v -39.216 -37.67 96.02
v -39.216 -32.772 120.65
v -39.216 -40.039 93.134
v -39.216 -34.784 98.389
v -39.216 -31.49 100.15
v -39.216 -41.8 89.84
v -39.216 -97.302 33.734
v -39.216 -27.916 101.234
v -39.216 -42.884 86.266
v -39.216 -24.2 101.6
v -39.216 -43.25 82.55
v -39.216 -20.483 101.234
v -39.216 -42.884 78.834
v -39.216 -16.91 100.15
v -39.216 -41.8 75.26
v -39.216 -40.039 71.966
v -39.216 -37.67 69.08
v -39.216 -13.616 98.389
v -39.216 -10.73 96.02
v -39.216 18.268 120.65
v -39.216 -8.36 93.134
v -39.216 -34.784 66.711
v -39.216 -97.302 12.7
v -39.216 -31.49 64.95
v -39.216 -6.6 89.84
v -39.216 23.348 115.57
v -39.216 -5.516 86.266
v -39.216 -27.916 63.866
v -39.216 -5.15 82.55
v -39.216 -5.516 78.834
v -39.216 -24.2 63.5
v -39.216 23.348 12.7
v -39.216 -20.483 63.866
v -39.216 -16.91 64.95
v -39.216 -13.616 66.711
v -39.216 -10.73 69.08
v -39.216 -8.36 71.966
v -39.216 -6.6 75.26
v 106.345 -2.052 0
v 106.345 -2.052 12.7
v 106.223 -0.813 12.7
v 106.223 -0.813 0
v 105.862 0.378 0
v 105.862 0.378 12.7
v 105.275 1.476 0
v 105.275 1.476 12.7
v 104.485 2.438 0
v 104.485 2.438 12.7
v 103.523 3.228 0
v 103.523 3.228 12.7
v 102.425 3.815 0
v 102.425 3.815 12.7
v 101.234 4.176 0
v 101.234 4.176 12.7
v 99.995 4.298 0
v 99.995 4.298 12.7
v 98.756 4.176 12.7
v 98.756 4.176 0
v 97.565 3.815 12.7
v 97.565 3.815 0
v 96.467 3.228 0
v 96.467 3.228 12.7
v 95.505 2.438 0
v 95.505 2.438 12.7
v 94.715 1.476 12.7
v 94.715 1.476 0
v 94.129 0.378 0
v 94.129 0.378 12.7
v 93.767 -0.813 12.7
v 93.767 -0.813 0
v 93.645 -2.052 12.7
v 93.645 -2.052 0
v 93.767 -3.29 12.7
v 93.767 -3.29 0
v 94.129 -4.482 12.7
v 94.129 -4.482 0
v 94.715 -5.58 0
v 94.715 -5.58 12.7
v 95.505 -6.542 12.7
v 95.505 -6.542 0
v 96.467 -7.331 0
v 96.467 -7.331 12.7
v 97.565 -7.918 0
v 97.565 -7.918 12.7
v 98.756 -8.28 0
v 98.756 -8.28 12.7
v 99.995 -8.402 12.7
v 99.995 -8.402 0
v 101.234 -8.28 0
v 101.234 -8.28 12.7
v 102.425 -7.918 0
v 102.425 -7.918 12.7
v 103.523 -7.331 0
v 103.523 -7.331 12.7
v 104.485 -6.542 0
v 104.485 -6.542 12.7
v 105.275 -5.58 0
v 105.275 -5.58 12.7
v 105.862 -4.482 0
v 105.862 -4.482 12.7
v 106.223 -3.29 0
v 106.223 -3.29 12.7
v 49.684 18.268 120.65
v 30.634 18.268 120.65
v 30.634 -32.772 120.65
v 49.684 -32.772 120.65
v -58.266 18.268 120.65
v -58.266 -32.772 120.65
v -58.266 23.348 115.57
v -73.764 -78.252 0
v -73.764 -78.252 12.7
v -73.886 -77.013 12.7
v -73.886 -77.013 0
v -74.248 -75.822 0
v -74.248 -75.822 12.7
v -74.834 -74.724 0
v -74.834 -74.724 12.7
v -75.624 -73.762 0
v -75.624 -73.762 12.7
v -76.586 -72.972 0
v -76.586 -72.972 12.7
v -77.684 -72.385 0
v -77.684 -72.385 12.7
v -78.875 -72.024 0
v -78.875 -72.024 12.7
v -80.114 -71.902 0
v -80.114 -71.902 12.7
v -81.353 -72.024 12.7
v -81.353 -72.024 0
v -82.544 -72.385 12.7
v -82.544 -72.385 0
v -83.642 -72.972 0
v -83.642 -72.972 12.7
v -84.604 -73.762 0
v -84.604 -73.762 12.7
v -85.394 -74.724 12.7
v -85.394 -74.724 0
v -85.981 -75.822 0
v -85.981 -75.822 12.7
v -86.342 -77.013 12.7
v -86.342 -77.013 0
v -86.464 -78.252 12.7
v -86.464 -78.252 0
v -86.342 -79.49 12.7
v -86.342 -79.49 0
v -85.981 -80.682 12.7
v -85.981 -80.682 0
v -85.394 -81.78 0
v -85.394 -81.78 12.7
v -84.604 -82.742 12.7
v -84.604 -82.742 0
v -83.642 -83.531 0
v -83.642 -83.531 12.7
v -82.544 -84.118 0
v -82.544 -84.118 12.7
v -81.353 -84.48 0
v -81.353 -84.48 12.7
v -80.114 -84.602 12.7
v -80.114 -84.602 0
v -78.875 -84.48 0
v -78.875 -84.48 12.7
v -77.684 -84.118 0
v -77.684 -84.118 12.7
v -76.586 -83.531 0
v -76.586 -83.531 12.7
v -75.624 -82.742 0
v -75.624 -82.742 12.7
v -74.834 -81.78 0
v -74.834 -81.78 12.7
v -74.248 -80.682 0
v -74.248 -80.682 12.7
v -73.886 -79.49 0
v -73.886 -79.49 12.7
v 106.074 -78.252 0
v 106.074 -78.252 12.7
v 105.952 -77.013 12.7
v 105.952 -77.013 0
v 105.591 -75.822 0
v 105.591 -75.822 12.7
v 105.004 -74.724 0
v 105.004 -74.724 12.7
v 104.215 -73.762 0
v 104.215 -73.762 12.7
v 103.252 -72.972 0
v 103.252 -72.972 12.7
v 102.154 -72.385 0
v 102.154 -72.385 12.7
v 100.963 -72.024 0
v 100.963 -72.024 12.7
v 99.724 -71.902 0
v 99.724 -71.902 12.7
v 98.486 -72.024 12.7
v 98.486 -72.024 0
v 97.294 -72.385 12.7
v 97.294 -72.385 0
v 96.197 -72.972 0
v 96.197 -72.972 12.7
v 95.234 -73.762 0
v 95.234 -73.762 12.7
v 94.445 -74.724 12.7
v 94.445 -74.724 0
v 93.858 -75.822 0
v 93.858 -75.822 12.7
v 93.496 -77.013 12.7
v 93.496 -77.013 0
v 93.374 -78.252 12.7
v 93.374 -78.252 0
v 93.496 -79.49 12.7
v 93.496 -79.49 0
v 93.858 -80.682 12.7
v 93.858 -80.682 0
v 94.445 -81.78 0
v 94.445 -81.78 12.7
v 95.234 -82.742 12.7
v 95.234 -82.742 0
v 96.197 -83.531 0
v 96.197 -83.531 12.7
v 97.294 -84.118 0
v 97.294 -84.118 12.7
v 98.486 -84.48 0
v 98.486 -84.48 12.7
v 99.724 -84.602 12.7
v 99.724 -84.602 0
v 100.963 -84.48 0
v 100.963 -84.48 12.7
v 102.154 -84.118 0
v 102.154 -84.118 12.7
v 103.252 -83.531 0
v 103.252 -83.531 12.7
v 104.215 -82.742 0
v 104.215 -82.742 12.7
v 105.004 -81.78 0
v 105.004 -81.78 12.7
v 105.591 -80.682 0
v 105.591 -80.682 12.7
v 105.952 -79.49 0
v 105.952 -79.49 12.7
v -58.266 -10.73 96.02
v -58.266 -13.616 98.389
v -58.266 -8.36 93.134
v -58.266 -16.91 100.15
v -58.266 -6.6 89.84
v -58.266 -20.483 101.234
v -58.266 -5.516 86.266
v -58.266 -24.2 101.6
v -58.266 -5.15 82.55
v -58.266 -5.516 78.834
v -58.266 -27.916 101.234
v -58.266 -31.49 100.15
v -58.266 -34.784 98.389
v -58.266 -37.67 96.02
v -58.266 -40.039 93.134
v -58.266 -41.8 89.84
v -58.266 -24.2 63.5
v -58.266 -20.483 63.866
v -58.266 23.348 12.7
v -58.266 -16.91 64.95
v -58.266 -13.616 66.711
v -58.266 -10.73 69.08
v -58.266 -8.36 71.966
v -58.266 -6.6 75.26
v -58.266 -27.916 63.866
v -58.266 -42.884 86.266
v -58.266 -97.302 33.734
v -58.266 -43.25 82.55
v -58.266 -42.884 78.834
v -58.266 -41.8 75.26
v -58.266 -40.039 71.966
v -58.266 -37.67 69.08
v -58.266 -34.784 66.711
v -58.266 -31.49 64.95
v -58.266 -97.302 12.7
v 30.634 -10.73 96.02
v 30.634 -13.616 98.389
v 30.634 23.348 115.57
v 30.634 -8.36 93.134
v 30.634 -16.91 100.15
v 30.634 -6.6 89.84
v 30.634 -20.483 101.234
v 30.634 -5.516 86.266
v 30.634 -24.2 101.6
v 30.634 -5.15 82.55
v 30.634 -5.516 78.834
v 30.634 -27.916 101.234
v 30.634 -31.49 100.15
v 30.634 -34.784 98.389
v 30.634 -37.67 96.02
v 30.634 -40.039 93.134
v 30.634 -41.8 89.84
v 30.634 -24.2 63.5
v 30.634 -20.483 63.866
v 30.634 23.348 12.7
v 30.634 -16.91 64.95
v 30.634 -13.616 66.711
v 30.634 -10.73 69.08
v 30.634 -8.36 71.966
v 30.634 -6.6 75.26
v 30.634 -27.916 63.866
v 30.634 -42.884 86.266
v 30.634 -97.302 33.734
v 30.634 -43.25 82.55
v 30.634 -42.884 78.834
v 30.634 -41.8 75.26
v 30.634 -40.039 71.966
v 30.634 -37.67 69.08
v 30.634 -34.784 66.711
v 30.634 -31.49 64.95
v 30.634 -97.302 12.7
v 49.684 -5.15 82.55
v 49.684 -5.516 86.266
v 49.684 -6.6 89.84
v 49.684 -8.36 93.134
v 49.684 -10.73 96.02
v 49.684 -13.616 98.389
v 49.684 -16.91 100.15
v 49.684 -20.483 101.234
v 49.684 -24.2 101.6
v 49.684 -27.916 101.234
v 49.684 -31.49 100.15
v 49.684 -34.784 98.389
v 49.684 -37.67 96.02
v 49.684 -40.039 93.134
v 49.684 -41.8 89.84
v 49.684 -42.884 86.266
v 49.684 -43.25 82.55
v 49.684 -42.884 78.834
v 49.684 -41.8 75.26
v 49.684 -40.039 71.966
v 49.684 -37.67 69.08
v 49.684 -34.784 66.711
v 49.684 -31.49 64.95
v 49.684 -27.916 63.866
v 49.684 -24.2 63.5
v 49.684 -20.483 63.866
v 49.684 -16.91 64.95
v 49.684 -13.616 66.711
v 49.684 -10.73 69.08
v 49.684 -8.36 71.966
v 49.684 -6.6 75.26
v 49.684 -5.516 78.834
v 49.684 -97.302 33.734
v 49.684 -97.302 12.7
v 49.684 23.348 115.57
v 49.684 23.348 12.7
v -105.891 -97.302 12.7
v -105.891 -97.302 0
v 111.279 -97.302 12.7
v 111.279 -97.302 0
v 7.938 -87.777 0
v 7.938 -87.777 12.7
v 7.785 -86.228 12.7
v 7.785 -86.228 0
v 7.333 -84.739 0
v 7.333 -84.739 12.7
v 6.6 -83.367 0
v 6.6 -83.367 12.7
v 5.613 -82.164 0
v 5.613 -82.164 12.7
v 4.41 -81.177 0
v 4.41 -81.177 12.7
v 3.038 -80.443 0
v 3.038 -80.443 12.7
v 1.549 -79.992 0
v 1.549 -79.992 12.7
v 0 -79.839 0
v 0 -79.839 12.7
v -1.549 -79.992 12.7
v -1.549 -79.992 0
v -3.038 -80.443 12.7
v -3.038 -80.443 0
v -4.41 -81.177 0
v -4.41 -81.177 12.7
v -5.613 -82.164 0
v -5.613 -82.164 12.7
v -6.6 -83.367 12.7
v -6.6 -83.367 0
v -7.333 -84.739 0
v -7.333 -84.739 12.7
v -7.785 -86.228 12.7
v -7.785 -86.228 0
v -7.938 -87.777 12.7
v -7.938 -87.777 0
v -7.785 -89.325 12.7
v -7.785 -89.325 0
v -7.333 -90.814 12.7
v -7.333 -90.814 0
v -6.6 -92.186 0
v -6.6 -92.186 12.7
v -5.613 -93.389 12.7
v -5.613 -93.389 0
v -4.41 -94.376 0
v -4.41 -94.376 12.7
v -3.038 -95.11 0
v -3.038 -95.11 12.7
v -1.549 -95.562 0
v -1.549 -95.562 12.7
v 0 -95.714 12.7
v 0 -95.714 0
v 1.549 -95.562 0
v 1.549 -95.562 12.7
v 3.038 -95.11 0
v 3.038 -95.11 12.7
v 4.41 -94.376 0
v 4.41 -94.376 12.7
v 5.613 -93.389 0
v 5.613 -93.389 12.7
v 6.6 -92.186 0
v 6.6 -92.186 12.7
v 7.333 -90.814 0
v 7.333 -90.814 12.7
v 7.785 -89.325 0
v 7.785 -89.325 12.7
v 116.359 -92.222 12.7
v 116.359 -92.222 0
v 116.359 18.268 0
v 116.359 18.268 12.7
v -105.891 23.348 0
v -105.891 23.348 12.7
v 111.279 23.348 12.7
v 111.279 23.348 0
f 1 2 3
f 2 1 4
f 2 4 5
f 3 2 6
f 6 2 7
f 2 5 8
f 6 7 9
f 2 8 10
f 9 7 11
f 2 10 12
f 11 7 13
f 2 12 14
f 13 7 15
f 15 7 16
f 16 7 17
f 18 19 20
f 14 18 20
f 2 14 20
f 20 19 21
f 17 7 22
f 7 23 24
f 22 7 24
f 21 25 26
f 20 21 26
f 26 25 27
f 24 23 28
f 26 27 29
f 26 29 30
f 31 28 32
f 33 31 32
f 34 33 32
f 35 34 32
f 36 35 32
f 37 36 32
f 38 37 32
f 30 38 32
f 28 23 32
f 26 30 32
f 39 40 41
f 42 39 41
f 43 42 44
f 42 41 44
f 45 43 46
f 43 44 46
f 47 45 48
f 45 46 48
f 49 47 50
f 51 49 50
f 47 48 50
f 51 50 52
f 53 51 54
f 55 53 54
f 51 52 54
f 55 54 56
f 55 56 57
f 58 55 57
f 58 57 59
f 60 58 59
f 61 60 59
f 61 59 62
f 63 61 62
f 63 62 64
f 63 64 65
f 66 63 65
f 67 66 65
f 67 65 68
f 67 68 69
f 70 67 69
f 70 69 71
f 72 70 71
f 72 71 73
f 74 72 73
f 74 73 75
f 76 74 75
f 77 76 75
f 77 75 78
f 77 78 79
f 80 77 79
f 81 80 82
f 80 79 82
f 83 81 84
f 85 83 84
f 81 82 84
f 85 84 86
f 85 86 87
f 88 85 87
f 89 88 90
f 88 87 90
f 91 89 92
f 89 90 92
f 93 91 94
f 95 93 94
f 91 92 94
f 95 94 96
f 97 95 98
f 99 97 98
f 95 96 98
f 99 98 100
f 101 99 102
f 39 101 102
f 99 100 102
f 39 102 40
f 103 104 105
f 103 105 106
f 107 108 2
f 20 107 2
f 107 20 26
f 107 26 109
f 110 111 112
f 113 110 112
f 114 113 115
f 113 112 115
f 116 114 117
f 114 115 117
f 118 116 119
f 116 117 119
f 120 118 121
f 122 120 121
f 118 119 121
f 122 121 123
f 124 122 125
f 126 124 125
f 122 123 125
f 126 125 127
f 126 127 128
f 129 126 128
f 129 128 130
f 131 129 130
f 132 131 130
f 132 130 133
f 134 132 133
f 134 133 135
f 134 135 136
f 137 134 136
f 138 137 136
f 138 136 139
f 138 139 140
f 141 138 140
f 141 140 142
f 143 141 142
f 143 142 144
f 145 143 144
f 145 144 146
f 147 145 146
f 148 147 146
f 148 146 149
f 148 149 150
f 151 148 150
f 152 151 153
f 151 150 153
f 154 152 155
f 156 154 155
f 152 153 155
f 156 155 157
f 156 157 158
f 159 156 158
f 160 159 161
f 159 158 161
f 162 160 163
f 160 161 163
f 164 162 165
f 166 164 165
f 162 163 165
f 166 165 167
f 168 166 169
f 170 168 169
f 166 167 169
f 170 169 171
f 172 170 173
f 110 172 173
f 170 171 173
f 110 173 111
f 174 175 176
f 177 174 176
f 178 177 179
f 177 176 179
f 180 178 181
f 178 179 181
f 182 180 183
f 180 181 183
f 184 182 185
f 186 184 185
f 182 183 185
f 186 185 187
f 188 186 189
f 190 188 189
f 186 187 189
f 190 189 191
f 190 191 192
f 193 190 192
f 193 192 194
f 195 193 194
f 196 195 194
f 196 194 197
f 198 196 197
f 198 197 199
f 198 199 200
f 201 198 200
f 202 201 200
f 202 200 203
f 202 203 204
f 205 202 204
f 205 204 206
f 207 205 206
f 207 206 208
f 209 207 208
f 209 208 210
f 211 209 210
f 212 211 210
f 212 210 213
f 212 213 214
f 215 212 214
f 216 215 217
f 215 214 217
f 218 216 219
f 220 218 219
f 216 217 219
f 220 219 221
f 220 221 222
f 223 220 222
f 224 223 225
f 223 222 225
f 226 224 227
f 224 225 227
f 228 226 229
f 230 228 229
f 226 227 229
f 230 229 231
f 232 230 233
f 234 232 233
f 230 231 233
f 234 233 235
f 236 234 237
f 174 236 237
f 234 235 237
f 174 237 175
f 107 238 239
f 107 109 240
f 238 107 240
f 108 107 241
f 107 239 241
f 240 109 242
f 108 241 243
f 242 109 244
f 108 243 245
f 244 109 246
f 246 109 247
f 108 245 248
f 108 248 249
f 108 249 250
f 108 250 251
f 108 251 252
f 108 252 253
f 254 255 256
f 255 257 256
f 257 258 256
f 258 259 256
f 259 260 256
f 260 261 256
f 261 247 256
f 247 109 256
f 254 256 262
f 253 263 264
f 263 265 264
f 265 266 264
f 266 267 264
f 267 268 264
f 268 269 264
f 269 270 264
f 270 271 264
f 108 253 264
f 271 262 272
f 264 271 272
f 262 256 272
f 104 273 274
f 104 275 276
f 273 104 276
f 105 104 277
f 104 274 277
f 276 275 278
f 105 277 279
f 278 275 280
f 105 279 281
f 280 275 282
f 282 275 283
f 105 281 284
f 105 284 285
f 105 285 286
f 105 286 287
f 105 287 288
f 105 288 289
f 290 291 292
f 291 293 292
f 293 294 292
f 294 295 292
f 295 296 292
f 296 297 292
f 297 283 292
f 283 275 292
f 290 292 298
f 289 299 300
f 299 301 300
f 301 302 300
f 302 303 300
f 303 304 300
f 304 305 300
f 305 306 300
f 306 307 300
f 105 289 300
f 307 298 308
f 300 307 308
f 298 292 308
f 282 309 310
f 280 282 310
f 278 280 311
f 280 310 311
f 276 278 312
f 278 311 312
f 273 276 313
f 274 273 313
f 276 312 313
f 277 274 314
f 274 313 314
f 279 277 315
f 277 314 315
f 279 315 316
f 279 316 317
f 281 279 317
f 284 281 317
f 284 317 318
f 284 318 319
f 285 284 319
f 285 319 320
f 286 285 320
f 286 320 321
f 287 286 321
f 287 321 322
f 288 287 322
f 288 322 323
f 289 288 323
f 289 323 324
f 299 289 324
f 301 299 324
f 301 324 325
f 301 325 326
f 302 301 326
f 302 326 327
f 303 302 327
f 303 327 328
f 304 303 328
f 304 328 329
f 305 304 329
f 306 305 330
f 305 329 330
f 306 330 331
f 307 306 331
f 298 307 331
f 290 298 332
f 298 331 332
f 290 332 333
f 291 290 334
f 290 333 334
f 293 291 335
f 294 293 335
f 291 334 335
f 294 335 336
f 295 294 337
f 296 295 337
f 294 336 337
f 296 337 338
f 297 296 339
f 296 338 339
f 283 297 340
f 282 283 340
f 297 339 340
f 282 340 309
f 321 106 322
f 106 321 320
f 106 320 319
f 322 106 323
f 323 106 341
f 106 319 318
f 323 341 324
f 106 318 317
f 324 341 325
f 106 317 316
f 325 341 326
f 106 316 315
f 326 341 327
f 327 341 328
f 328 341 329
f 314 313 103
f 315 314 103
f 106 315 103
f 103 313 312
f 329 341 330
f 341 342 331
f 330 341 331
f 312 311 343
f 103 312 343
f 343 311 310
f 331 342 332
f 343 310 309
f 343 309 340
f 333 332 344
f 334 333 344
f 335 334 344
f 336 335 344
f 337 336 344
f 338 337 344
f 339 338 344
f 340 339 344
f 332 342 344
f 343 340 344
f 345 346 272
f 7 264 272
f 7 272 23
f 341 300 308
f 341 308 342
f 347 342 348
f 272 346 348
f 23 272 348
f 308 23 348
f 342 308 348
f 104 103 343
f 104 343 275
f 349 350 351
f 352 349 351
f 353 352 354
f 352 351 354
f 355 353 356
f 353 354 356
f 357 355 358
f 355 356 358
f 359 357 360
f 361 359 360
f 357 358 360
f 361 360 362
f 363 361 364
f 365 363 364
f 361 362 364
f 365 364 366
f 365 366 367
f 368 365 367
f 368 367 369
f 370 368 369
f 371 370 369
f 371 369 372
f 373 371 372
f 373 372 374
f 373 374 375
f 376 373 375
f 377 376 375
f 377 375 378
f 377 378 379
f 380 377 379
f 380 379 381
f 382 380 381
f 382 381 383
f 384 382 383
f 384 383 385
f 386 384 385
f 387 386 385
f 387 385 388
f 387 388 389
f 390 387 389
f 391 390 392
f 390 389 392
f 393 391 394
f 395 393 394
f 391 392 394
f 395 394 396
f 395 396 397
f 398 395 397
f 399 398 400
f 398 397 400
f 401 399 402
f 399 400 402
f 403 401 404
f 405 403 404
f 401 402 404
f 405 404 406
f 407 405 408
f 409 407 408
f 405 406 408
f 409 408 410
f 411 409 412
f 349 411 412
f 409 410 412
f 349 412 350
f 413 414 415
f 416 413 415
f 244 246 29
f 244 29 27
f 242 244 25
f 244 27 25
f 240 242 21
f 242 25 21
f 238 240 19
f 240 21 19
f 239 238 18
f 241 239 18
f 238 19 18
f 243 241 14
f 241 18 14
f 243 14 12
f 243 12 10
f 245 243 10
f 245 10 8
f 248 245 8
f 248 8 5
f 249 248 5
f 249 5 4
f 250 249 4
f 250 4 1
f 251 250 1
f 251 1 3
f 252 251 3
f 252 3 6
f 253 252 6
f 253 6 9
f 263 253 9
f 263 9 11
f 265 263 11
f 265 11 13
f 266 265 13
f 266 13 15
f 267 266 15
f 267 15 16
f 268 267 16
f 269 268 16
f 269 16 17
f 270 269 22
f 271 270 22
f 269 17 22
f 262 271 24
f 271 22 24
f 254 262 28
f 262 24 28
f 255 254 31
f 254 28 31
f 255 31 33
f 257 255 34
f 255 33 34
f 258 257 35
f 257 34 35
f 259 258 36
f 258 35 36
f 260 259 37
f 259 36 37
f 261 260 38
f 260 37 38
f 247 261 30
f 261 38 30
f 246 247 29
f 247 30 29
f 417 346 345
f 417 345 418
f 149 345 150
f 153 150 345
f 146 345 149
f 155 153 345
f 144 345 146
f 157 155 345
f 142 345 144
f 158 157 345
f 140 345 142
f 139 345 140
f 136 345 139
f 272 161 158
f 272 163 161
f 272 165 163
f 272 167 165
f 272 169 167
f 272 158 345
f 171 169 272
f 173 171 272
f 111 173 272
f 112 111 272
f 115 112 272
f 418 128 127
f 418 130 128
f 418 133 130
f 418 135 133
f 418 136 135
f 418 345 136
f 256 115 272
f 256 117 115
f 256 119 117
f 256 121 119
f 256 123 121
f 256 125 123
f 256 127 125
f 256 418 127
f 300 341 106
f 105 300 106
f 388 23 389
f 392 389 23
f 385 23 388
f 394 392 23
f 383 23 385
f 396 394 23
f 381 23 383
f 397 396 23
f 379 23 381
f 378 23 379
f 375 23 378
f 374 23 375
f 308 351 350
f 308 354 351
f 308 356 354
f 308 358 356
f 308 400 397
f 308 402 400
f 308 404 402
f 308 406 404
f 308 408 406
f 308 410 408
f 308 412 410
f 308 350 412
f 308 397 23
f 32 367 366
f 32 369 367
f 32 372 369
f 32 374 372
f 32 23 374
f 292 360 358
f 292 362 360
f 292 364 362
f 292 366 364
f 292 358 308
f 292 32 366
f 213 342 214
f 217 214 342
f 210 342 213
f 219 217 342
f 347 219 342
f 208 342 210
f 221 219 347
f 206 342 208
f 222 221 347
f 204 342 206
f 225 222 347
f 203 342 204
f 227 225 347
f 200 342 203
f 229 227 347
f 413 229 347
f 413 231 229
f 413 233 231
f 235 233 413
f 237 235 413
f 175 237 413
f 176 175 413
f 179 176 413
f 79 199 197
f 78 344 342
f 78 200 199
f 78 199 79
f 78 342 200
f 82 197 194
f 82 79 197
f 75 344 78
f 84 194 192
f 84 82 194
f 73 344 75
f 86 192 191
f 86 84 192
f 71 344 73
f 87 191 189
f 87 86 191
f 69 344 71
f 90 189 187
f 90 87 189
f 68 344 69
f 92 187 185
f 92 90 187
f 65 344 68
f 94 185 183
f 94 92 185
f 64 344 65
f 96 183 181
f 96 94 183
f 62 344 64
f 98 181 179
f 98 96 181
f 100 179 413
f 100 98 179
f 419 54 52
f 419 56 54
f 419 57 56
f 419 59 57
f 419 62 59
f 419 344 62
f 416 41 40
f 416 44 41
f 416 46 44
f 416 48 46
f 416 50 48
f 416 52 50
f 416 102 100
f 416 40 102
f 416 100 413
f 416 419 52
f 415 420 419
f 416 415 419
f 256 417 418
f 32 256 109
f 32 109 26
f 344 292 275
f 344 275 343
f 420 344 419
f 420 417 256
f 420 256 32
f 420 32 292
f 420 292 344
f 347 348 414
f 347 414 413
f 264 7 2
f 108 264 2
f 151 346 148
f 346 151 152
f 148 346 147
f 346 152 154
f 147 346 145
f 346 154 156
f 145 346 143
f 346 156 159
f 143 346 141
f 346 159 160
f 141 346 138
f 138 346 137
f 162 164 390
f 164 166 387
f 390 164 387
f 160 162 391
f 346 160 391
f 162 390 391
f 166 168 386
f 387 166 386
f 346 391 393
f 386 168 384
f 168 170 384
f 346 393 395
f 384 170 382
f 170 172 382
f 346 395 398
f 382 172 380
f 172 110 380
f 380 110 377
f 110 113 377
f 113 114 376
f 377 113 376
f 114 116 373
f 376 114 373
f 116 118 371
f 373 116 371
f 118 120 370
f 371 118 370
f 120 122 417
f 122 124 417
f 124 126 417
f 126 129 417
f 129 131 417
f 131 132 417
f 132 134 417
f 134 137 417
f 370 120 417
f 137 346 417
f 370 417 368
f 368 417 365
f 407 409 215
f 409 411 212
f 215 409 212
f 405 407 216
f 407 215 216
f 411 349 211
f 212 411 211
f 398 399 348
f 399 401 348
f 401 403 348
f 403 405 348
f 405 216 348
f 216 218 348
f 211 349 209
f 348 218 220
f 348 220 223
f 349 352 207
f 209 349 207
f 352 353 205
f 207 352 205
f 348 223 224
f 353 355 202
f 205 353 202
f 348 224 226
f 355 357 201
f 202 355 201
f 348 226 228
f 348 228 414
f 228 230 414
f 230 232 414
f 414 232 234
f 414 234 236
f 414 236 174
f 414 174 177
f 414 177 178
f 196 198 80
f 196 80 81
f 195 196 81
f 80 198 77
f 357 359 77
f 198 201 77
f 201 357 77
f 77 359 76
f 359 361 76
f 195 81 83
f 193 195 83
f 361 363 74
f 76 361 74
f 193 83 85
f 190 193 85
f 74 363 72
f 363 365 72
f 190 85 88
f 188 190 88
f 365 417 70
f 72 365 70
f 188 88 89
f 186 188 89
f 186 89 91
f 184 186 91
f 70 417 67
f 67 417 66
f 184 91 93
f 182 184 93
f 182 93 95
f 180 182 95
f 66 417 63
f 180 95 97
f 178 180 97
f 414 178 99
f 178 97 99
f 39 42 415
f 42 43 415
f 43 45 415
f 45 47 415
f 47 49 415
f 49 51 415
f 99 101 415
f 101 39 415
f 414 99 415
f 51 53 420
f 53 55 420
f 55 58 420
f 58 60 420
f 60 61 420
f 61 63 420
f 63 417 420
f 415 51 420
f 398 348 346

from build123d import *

# Parameters (mm, degrees)
F0_W      = 222.25
F0_H      = 120.65
F1_DEPTH  = 12.7
F3_DEPTH  = 107.95
F5_DEPTH  = 107.95
F6_SIZE2  = 5.08
F6_SIZE   = 5.08
F7_R      = 19.05
F8_DEPTH  = 192.278
F9_SIZE   = 5.08
F10_SIZE  = 5.08
F11_SIZE  = 5.08
F12_R     = 6.35
F12_R_2   = 7.9375
F13_DEPTH = 25.4
F15_DEPTH = 216.154


with BuildPart() as f1:
    # F0 (on Top) → F1 (new body)
    with BuildSketch(Plane.XY):
        with Locations((5.2343402058, -36.9766564707)):
            Rectangle(F0_W, F0_H)
    extrude(amount=F1_DEPTH)

    # F2 (on face) → F3 (join)
    with BuildSketch(Plane.XY.offset(12.7)):
        Polygon((-58.2656597942, 23.3483435293), (-58.2656597942, -85.1823836565), (-58.2656597942, -97.3016564707), (-39.2156597942, -97.3016564707), (-39.2156597942, 23.3483435293), align=None)
    extrude(amount=F3_DEPTH)

    # F4 (on face) → F5 (join)
    with BuildSketch(Plane.XY.offset(12.7)):
        Polygon((30.6343402058, 23.3483435293), (30.6343402058, -84.2409580946), (30.6343402058, -97.3016564707), (49.6843402058, -97.3016564707), (49.6843402058, 23.3483435293), align=None)
    extrude(amount=F5_DEPTH)

    # F6
    f6_edges = [f1.edges().sort_by_distance(p)[0] for p in [
        (40.15934, 23.348344, 120.65),
    ]]
    chamfer(f6_edges, length=F6_SIZE, length2=F6_SIZE2)

    # F7 (on face) → F8 (cut)
    with BuildSketch(Plane.YZ.offset(49.6843402058)):
        with Locations((-24.1999551654, 82.55)):
            Circle(F7_R)
    extrude(amount=-F8_DEPTH, mode=Mode.SUBTRACT)

    # F9
    f9_edges = [f1.edges().sort_by_distance(p)[0] for p in [
        (-48.74066, 23.348344, 120.65),
    ]]
    chamfer(f9_edges, length=F9_SIZE)

    # F10
    f10_edges = [f1.edges().sort_by_distance(p)[0] for p in [
        (116.35934, -97.301656, 6.35),
    ]]
    chamfer(f10_edges, length=F10_SIZE)

    # F11
    f11_edges = [f1.edges().sort_by_distance(p)[0] for p in [
        (116.35934, 23.348344, 6.35),
    ]]
    chamfer(f11_edges, length=F11_SIZE)

    # F12 (on face) → F13 (cut)
    with BuildSketch(Plane.XY.offset(12.7)):
        with Locations((99.7244338119, -78.2516564707)):
            Circle(F12_R)
        with Locations((99.9952717069, -2.0516564707)):
            Circle(F12_R)
        with Locations((-80.1142602397, -78.2516564707)):
            Circle(F12_R)
        with Locations((0, -87.7766564707)):
            Circle(F12_R_2)
    extrude(amount=-F13_DEPTH, mode=Mode.SUBTRACT)

    # F14 (on face) → F15 (cut)
    with BuildSketch(Plane.YZ.offset(49.6843402058)):
        Polygon((-97.3016564707, 120.65), (-97.3016564707, 33.7335392833), (-32.7723734081, 120.65), align=None)
    extrude(amount=-F15_DEPTH, mode=Mode.SUBTRACT)


solid = f1.part
